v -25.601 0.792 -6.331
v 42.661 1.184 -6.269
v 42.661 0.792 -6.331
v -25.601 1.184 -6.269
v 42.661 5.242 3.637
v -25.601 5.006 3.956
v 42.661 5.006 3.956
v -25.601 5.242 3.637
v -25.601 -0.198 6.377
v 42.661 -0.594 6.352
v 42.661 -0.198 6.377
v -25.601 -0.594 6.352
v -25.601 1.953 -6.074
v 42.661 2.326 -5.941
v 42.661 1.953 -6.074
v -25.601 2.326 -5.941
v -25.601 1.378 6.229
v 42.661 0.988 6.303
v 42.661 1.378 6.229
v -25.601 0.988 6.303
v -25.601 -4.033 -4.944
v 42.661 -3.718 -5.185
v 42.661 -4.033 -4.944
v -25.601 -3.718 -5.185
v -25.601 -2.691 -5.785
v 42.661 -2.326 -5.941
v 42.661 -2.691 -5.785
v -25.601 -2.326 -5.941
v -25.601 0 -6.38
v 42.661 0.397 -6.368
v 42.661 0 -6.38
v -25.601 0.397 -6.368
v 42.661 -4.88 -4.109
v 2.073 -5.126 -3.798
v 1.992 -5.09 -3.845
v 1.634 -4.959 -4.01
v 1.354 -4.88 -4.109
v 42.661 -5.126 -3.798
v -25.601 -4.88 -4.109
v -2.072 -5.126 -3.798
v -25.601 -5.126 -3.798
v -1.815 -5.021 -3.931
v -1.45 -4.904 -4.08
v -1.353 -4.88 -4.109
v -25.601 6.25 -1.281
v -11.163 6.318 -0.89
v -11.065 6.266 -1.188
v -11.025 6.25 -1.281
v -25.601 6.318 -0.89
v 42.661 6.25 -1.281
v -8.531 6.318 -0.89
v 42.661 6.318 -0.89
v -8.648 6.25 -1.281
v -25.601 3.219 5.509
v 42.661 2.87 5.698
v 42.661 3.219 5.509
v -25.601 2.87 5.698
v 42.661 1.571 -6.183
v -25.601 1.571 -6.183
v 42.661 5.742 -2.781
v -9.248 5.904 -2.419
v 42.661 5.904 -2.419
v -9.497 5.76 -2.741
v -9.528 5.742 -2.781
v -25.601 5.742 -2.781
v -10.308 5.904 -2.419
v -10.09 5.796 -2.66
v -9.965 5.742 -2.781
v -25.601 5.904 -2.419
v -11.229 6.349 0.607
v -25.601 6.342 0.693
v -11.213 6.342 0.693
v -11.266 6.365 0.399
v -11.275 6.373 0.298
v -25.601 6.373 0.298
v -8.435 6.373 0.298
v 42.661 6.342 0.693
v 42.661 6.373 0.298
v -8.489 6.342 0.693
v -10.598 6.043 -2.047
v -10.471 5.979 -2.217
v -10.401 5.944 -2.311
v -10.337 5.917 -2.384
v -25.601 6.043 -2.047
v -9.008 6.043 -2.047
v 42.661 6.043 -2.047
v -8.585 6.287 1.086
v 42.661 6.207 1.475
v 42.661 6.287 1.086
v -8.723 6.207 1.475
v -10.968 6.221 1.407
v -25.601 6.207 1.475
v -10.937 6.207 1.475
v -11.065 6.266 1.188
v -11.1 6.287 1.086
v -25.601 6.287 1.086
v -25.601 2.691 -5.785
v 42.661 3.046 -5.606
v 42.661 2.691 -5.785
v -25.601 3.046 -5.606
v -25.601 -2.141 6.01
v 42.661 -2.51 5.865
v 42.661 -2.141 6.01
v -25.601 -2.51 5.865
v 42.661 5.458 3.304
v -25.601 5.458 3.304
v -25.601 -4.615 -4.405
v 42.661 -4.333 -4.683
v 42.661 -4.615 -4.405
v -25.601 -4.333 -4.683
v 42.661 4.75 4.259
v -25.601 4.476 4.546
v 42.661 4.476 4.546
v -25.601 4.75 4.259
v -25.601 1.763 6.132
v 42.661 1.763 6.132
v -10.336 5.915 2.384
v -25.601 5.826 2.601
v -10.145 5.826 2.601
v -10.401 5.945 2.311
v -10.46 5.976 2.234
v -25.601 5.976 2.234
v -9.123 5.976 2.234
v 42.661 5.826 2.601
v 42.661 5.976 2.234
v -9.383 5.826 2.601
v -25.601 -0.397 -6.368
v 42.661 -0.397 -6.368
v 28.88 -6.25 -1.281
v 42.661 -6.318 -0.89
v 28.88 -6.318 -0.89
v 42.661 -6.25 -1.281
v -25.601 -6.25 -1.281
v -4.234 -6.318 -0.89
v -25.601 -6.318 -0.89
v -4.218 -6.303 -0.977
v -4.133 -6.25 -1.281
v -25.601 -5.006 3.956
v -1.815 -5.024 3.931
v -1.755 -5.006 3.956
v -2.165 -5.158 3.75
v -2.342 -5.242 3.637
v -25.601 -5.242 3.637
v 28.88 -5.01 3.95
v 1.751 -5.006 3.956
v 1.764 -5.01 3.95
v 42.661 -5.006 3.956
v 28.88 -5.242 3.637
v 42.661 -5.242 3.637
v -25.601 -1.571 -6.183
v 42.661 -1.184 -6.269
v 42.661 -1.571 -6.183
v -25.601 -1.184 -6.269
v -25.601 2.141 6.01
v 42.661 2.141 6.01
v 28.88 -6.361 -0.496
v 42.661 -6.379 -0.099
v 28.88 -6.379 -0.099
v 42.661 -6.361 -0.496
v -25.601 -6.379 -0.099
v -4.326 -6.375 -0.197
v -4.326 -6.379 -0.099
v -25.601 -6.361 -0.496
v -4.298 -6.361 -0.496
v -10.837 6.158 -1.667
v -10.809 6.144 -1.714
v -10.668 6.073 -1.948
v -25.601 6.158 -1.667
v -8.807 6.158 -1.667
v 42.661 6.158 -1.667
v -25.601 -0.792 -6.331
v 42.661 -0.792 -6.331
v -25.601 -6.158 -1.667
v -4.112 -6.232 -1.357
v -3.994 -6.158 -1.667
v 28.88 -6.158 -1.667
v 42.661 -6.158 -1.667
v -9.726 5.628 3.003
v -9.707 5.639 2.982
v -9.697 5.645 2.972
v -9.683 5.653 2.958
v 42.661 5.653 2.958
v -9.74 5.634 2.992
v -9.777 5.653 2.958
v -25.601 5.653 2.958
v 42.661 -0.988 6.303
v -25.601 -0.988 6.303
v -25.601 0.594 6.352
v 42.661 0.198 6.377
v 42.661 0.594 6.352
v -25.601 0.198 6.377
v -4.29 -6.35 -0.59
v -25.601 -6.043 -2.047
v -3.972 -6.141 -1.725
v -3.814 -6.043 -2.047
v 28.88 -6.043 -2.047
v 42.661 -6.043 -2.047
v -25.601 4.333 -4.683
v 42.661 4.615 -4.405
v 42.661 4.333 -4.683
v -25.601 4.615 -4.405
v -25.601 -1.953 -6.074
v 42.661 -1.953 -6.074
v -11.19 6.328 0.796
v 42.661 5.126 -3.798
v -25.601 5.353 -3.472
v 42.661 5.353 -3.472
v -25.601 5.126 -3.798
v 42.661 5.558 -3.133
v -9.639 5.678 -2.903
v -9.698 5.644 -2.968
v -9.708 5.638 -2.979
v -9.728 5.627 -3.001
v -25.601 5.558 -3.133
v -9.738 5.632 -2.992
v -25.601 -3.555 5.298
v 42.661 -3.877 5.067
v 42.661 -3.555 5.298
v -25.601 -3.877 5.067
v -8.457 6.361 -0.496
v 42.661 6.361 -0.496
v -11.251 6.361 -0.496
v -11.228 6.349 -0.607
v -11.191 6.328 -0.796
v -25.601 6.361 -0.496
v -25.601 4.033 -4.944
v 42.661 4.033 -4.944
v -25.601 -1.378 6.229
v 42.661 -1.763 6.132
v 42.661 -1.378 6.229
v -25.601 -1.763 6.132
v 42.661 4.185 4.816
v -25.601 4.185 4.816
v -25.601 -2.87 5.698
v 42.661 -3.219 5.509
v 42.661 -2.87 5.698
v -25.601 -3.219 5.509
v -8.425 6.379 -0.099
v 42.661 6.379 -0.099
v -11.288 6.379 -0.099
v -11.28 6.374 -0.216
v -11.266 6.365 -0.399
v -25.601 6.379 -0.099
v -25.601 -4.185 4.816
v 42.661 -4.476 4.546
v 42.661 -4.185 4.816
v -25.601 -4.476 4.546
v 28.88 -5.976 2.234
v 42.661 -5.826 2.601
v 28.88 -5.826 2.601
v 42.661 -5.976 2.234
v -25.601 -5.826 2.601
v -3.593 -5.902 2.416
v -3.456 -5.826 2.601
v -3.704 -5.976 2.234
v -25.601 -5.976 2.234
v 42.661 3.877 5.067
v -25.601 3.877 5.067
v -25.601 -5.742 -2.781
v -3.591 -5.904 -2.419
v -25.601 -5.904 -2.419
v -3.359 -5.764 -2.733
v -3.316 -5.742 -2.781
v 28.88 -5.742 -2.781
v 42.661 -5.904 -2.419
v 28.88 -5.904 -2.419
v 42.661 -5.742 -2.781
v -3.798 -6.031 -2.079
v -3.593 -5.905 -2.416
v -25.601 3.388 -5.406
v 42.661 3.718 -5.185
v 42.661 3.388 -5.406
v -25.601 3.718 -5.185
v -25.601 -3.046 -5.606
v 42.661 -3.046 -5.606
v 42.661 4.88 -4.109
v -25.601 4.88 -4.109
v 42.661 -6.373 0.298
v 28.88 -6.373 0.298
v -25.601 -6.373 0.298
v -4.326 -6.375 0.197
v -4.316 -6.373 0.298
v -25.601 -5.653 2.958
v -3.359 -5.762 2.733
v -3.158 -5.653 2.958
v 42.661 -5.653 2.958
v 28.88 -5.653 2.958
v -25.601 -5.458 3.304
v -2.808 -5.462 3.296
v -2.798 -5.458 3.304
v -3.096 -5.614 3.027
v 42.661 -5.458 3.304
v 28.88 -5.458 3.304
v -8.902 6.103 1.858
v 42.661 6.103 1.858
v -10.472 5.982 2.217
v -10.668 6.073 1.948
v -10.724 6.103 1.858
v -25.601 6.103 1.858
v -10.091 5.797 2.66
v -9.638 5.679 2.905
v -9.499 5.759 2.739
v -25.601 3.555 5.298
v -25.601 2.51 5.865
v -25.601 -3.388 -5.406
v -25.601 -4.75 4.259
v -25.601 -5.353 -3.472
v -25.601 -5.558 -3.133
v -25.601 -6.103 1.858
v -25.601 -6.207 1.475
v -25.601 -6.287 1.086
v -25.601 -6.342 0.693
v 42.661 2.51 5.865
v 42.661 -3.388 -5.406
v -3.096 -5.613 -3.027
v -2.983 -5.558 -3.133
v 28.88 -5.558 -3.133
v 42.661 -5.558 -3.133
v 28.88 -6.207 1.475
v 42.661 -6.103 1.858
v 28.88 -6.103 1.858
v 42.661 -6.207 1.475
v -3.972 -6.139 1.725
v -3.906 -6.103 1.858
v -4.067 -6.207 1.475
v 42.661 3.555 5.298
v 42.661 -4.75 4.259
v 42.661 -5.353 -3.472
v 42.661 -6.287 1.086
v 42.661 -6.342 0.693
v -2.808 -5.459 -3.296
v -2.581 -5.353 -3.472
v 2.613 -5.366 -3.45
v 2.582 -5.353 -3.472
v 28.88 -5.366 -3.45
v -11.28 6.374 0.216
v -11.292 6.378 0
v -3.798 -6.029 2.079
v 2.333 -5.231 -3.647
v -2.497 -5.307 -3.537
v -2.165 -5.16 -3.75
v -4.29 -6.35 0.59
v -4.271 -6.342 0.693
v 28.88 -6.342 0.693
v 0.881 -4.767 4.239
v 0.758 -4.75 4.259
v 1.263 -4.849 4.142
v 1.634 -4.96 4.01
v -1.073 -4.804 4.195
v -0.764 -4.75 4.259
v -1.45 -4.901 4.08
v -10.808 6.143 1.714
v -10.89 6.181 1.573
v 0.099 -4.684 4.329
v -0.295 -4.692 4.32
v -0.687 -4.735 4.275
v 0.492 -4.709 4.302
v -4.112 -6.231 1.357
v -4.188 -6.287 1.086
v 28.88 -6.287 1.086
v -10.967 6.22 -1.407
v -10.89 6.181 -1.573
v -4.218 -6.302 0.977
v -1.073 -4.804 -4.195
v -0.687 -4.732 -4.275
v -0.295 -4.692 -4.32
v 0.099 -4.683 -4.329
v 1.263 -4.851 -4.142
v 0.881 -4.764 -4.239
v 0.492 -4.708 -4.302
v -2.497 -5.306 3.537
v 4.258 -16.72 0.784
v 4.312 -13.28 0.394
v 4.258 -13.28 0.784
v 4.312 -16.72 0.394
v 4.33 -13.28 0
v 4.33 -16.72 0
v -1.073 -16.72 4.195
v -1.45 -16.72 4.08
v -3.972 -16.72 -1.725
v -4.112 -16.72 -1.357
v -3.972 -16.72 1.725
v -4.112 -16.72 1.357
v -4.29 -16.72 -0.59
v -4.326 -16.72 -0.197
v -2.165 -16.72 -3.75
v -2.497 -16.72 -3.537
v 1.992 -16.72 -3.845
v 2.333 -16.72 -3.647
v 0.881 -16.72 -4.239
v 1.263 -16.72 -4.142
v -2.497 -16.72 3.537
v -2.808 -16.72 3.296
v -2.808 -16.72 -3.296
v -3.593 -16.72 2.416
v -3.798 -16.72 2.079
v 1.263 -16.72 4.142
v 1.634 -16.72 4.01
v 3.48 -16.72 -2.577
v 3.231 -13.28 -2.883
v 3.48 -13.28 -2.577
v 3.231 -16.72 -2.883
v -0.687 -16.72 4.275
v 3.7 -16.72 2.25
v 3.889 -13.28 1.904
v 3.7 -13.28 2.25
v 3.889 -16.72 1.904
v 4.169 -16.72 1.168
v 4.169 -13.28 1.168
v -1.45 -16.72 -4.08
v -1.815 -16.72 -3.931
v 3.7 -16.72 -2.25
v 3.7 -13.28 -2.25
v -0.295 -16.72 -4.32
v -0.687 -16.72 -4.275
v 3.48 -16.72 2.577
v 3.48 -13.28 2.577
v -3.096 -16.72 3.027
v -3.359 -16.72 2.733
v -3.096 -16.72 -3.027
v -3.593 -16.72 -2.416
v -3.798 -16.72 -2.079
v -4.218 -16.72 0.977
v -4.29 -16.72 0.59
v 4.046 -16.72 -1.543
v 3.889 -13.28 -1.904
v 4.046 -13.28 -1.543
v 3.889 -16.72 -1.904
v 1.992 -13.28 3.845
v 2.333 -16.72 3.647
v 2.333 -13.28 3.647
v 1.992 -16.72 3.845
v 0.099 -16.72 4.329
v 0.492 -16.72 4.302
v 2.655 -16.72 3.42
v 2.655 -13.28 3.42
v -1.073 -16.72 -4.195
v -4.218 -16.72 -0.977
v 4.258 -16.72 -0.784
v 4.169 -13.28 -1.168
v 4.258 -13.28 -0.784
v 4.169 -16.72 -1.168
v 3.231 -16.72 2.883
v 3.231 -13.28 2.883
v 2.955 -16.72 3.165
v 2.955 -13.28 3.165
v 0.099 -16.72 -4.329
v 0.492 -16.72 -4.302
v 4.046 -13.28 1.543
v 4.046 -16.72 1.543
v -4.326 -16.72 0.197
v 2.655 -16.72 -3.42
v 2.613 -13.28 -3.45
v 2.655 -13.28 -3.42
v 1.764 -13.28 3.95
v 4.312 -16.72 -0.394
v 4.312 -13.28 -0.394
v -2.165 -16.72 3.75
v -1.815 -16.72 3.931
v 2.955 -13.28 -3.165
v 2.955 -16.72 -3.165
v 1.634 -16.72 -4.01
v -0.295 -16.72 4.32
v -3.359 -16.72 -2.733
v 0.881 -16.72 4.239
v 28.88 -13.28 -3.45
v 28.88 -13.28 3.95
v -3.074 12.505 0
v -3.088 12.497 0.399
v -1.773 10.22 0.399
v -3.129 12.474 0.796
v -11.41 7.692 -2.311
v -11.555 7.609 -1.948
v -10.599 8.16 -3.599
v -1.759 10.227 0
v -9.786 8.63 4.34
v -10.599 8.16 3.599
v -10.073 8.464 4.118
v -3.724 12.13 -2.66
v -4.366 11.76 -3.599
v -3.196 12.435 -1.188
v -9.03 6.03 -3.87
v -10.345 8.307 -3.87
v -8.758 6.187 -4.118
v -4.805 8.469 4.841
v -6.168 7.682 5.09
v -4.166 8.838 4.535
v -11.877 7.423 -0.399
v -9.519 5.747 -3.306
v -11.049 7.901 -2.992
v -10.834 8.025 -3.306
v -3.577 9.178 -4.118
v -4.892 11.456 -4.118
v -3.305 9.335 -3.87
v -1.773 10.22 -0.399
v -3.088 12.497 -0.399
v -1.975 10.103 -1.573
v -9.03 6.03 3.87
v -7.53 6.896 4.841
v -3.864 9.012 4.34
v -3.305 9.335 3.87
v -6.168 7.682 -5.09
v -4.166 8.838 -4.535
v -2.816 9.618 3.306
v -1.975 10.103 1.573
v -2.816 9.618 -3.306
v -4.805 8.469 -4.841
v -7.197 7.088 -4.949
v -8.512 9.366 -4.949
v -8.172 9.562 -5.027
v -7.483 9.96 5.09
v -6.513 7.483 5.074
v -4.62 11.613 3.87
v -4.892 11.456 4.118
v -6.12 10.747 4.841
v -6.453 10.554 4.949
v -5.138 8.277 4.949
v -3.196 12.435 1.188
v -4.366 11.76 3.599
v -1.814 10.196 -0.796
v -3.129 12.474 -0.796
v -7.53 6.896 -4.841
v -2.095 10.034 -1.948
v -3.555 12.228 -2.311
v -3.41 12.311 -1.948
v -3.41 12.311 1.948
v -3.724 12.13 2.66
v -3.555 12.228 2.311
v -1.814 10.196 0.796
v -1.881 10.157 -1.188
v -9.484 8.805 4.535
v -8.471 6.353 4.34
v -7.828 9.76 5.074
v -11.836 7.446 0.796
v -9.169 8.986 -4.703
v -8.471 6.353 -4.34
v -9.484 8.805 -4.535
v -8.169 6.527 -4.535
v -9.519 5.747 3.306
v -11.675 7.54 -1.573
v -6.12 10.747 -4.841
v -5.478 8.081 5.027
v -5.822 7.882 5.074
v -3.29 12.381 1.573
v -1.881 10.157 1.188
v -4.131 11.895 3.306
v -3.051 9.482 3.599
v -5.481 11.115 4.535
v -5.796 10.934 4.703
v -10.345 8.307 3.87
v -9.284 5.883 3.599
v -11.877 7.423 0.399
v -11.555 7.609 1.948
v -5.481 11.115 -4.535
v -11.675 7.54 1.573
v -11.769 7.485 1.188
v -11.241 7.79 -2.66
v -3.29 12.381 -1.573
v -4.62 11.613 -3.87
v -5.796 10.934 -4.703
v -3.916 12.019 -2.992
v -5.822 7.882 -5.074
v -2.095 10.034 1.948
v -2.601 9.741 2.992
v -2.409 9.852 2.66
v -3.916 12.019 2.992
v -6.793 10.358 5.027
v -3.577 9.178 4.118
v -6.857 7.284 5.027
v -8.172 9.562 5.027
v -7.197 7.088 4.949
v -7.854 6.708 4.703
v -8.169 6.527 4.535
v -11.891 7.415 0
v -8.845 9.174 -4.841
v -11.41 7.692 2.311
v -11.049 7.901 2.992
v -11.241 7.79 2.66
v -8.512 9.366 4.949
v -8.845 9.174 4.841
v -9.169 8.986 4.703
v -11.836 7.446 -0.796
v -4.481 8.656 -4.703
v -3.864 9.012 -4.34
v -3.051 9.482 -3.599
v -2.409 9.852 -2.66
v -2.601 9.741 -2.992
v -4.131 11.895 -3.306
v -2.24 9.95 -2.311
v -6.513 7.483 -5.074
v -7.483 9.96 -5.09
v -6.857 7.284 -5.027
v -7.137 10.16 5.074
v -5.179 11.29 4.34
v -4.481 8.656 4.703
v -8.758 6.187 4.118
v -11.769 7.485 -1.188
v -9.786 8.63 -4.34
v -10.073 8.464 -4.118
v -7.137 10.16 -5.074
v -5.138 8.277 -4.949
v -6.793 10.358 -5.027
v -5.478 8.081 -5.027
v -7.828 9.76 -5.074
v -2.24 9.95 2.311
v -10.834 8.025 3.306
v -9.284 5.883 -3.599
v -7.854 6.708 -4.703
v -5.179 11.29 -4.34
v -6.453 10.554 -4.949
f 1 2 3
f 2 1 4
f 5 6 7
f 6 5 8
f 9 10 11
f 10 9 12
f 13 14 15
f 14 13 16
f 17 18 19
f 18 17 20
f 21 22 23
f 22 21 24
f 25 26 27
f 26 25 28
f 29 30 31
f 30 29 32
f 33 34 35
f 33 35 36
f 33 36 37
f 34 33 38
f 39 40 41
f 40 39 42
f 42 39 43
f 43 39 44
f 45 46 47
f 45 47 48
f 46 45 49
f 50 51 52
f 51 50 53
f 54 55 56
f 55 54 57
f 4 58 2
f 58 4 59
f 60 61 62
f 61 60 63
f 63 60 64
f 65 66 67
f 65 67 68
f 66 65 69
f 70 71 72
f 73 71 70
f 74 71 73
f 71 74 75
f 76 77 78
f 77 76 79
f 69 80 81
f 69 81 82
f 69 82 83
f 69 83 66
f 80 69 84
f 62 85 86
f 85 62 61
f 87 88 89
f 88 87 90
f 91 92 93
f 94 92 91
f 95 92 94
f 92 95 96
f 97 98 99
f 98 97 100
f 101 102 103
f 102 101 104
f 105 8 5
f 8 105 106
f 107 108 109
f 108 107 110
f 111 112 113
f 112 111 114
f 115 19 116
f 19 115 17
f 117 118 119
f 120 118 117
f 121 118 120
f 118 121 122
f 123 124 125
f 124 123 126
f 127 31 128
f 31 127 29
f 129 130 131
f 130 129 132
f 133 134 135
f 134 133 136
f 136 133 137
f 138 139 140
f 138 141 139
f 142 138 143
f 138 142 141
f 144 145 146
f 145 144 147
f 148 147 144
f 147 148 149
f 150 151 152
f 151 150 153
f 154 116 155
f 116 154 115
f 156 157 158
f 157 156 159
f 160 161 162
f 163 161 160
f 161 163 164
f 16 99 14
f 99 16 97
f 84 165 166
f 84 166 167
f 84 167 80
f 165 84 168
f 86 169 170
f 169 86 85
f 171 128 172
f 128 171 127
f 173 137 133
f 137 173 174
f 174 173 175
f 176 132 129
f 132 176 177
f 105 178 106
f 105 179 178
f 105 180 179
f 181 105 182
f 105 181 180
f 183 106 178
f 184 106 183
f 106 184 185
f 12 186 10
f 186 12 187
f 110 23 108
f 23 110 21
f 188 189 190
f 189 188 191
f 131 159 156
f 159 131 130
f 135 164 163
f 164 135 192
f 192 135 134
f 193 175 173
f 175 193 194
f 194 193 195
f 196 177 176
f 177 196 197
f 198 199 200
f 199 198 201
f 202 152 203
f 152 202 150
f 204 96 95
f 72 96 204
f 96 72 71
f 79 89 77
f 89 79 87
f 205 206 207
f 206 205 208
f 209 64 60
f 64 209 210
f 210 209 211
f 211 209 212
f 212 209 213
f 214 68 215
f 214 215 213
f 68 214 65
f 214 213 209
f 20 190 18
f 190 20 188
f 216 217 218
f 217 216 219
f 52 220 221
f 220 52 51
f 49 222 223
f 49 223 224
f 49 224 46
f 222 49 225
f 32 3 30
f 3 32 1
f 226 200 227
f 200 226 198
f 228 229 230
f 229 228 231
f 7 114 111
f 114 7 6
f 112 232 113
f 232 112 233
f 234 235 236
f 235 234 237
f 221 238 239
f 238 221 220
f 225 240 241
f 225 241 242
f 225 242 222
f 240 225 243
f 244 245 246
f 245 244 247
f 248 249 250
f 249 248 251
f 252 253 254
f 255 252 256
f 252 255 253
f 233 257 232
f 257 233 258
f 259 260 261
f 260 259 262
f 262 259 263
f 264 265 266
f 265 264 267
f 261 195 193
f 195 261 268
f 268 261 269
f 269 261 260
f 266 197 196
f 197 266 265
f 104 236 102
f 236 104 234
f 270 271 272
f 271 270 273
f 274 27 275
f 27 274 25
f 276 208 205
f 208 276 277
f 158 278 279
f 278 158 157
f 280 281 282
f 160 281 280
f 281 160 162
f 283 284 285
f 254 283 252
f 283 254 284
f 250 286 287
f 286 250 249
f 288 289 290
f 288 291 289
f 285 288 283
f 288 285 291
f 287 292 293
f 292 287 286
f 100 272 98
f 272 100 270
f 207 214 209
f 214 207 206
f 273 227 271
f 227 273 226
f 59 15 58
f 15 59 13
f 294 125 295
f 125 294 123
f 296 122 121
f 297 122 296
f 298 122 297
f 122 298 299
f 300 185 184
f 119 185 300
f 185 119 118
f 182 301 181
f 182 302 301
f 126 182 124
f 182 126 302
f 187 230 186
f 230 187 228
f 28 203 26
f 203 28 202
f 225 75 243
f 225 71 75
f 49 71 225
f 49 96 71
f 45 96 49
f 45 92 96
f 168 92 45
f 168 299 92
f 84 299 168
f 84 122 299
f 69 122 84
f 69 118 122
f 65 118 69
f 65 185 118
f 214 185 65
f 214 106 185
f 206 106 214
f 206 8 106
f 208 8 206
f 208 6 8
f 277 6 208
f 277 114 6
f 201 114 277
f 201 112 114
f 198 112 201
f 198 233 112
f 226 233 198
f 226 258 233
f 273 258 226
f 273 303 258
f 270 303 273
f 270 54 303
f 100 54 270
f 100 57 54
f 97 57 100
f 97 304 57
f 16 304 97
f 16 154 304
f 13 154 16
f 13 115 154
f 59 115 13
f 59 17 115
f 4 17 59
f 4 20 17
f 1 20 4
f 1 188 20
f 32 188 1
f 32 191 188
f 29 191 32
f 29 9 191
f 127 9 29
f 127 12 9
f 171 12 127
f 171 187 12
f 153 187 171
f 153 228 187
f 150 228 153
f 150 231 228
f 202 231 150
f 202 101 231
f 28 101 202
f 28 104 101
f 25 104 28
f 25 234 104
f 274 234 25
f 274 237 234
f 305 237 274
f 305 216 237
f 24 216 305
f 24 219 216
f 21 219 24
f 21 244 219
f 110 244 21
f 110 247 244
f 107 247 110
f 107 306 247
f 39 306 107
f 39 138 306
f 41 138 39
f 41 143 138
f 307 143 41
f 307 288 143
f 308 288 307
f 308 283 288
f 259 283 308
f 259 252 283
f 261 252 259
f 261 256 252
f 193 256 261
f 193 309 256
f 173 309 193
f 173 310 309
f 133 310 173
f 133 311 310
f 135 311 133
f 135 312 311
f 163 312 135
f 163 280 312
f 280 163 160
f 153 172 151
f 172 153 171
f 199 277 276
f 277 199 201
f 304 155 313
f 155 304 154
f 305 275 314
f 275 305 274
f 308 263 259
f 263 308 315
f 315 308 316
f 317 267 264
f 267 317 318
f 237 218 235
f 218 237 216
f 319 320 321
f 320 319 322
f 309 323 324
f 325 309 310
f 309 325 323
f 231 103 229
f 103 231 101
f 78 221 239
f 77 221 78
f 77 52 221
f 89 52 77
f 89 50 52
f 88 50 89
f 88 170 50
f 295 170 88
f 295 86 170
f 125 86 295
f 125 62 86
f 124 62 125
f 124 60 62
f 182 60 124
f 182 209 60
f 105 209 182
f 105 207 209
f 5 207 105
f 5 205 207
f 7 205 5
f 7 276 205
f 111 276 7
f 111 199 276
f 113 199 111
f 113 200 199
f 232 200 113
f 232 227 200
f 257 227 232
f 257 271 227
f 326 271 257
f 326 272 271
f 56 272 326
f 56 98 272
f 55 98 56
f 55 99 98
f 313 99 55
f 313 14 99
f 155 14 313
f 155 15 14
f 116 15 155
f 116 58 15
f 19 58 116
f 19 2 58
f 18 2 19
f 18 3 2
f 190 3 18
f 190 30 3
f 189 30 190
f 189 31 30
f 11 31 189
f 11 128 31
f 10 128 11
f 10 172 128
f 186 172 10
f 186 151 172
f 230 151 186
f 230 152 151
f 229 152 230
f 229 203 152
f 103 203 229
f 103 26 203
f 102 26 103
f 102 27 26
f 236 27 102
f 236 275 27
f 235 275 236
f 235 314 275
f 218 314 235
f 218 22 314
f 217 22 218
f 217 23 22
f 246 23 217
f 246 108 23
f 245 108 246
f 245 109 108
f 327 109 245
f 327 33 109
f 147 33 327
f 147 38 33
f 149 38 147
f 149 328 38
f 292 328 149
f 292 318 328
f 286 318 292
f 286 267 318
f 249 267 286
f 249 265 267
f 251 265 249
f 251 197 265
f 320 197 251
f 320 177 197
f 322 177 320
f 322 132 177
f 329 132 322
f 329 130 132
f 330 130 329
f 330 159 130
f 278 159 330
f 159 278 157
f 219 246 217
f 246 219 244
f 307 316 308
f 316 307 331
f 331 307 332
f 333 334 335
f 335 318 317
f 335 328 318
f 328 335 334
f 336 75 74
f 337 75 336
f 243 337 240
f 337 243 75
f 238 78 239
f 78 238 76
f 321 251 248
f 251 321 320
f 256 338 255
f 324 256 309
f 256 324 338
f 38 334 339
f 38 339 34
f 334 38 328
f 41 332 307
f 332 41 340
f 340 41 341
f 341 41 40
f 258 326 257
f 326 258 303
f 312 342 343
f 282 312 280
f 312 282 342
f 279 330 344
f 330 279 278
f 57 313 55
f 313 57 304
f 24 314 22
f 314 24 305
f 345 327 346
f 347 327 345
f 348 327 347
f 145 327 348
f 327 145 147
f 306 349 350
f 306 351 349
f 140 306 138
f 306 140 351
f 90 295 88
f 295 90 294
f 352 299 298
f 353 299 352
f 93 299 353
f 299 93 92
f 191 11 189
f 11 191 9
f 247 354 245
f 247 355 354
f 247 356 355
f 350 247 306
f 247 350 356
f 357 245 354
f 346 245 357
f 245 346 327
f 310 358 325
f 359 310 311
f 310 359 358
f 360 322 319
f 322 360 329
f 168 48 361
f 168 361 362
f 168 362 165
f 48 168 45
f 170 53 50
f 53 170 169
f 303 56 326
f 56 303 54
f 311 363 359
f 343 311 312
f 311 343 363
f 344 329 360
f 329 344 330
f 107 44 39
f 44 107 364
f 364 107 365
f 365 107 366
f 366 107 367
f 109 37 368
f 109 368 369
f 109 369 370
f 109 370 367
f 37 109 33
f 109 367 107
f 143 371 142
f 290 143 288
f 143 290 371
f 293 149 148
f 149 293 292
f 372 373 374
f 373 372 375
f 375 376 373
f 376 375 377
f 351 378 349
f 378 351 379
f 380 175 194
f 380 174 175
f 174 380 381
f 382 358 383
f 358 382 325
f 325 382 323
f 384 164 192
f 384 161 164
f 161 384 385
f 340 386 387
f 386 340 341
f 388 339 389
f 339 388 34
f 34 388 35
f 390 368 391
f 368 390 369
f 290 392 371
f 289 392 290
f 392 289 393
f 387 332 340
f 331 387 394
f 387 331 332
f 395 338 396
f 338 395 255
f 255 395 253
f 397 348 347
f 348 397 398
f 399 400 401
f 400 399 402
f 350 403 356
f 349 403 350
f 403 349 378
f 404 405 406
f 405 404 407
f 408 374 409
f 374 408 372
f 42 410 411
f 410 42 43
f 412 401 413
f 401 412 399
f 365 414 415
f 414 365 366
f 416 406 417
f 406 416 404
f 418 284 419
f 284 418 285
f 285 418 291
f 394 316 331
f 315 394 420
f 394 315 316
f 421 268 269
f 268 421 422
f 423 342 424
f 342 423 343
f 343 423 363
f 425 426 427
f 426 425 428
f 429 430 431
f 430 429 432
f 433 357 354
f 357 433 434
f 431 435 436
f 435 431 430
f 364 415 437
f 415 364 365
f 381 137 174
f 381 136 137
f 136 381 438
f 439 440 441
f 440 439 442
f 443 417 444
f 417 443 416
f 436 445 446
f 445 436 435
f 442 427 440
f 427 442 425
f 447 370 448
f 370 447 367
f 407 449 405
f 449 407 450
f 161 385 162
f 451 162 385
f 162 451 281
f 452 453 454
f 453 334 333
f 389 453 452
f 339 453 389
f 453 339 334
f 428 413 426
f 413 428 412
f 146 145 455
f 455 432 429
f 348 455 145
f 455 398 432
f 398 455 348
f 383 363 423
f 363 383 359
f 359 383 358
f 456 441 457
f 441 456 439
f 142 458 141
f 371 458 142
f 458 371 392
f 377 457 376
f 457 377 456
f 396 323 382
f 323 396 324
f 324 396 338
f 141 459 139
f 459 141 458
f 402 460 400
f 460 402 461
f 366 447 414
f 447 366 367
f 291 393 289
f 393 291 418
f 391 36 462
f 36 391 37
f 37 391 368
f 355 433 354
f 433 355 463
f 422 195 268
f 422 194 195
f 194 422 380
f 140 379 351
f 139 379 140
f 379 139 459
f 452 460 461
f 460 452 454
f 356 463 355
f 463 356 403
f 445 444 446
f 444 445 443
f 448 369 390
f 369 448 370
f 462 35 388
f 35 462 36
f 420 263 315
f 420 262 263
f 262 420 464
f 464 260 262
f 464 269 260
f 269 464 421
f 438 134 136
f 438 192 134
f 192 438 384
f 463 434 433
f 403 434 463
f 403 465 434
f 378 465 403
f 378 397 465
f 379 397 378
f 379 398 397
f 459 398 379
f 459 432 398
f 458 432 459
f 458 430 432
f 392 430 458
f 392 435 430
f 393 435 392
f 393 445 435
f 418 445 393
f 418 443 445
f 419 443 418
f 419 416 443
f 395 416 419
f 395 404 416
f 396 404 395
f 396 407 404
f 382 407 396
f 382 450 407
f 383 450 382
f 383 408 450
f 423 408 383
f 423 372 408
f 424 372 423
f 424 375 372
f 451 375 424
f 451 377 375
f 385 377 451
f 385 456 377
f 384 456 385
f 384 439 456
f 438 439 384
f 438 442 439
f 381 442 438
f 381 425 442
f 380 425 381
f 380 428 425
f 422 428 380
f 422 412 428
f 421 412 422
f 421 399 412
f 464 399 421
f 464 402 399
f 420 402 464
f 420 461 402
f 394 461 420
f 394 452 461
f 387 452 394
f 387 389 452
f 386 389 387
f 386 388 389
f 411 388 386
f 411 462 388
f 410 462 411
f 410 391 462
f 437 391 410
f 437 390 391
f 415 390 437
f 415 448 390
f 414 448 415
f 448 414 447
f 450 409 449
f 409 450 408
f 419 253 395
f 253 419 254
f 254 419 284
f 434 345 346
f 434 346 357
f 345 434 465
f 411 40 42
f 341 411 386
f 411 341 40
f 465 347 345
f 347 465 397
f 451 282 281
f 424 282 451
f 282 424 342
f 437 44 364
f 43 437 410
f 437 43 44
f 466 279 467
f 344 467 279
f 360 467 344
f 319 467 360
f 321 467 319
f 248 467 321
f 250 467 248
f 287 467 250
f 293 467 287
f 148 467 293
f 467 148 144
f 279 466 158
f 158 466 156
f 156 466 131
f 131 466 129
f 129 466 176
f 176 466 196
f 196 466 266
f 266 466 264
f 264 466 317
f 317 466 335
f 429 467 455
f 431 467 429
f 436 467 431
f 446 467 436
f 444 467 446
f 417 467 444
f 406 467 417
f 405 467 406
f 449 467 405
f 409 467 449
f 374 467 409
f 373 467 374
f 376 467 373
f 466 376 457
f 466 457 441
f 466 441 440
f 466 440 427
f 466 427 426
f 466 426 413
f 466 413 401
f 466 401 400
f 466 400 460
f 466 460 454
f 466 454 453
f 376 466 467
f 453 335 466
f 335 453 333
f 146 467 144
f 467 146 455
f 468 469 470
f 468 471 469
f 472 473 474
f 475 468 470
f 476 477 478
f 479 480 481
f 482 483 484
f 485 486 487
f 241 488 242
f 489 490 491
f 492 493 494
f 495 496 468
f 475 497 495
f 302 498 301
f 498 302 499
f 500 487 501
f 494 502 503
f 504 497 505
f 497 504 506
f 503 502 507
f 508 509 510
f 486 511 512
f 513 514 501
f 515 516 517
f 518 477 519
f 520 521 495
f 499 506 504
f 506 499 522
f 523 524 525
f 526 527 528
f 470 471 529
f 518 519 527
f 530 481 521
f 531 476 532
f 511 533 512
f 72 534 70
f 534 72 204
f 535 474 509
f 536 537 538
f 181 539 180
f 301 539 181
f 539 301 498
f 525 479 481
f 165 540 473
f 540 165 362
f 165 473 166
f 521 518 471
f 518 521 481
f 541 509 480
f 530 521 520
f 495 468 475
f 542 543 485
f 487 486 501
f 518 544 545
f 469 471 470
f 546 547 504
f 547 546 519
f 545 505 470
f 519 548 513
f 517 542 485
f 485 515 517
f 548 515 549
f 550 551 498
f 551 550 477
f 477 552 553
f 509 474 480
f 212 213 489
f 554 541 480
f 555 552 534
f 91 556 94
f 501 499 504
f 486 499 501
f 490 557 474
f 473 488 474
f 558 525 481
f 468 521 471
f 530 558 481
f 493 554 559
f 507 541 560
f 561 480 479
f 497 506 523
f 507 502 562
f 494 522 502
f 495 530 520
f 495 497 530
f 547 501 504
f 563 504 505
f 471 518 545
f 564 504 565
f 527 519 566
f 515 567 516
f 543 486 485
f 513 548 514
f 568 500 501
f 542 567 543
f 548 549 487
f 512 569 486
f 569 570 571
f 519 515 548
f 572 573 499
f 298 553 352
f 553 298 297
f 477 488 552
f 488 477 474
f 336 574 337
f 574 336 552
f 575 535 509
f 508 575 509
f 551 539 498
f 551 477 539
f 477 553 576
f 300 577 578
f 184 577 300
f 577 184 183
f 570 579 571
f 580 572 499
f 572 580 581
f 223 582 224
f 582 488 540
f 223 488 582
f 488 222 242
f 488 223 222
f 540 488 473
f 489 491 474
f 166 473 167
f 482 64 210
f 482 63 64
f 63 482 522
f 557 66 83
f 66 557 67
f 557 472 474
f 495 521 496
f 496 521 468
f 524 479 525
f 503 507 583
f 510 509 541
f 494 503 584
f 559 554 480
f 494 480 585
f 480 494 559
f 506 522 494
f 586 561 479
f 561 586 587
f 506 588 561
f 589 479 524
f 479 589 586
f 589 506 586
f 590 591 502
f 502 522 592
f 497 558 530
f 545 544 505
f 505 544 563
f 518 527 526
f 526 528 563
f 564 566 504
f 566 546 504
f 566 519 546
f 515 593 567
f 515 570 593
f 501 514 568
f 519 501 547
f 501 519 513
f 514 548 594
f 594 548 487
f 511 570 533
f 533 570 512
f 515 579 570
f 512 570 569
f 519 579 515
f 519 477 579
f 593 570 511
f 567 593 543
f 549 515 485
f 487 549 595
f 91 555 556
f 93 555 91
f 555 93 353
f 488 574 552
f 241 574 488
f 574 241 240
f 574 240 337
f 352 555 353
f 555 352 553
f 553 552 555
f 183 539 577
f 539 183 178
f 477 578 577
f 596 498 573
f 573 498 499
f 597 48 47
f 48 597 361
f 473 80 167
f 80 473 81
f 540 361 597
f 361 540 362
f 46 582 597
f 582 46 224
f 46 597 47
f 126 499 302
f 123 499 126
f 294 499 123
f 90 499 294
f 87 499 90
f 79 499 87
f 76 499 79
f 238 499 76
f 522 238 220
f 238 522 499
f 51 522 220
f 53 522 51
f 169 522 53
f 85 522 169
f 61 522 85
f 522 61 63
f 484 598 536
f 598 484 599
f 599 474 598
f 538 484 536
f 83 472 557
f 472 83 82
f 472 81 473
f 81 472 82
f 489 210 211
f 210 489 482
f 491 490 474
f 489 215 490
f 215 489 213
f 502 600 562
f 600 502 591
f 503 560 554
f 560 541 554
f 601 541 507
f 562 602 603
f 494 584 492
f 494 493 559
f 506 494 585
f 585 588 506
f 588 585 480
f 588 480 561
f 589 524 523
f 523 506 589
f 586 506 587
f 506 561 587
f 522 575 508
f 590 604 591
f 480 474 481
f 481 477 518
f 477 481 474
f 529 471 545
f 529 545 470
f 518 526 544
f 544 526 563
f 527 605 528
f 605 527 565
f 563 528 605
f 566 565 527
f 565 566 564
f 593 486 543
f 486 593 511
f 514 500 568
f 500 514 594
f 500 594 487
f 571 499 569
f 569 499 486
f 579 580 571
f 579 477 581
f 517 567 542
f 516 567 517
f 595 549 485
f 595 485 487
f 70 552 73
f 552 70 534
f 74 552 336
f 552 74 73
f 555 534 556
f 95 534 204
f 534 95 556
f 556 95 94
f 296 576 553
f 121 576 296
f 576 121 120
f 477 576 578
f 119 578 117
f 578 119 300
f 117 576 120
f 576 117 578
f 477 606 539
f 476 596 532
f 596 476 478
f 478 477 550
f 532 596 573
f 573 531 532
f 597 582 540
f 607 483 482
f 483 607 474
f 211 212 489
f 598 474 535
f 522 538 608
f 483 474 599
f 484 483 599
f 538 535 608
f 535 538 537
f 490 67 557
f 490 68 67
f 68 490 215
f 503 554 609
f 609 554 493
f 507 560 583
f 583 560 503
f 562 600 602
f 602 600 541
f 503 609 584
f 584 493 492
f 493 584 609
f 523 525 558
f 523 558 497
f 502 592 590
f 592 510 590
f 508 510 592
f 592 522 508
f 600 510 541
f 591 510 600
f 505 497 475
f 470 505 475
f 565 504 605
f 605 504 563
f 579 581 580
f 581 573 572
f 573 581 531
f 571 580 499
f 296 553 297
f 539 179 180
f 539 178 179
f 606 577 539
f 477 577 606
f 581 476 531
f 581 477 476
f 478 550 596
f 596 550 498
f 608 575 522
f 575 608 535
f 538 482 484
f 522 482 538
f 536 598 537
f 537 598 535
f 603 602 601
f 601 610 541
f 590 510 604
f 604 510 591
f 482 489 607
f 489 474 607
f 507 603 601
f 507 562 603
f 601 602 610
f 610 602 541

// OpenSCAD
// file: master_airbrush_measurements.scad
eps = 0.05;
measured_barrel_diameter = 12.01; 
barrel_length = 68.26;
barrel_back_to_air_hose = 21.27;
brace_height = 6.9;
brace_width = 7.40;
brace_length = 28.88;
air_hose_diameter = 8.66;
air_hose_barrel_length = 10.34;
m_trigger_pad_diameter = 10.18;
m_trigger_pad_thickness = 2.63;
m_trigger_pad_cl_to_barrel_cl_0_degrees = 10.65;

pad_diameter = 10.74;
pad_height = 2.60;
// main file
include <master_airbrush_measurements.scad>;

/* [Boiler Plate] */

$fa = 1;
$fs = 0.4;
eps = 0.001;

infinity = 1000;

/* [Show] */

show_air_brush = true;
barrel_diameter_clearance = 0.75;

barrel_diameter = measured_barrel_diameter + barrel_diameter_clearance;
_trigger_pad_diameter = m_trigger_pad_diameter + 0.0;
_trigger_pad_thickness = m_trigger_pad_thickness + 0.0;

module _barrel() {
    // Display horizontal zero 
    h = barrel_length +2*eps;
    d = barrel_diameter;
    translate([-eps, 0, 0]) rotate([0,90,0]) cylinder(h=h, d=d, center=false);
}

module _air_hose_barrel() {
    dx = barrel_back_to_air_hose + air_hose_diameter/2;
    h = air_hose_barrel_length + barrel_diameter/2;
    
    translate([dx, 0, 0]) 
        rotate([90,0,0]) 
            cylinder(h=h, d=air_hose_diameter, center=false);
}

module _brace() {
    // Entire block, before carve outs
    x = brace_length + air_hose_diameter/2;
    z = brace_height + barrel_diameter/2;
    dx = barrel_back_to_air_hose + air_hose_diameter/2;
    dz = -brace_height/2;
    translate([dx, 0, dz]) rotate([90, 0, 0]) cube([brace_length, brace_width, z]);
}

module _trigger_piece(angle) {
    pivot_offset = 3; // This is a guess
    dy_pivot = m_trigger_pad_cl_to_barrel_cl_0_degrees + pivot_offset;
    translate([0, -pivot_offset, 0])
    rotate([0, 0, angle]) {
        translate([0, dy_pivot, 0]) rotate([90, 0, 0]) {
            cylinder(h=_trigger_pad_thickness, d=_trigger_pad_diameter, center=true);
        }
    }
}

* _trigger_piece(30);

module _trigger(angle) {
    dx = barrel_back_to_air_hose + air_hose_diameter/2;
    dy = m_trigger_pad_cl_to_barrel_cl_0_degrees;
    translate([dx, 0, 0]) _trigger_piece(angle);
}

module air_brush(trigger_angle) {

    dx = -barrel_back_to_air_hose - air_hose_diameter/2;
    color("Red", alpha=0.25) {
        translate([dx, 0, 0]) {
            _barrel();
            _air_hose_barrel();
            _brace();
            _trigger(trigger_angle);
        }
    }
}
if (show_air_brush) {
    air_brush(trigger_angle=30);
}



module _trigger_cap_clearance() {
    width = 40;
    bottom_radius = 8;
    top_radius = 22;
    height = top_radius - bottom_radius;
    dz = -width/2;
    rotate([90, 0, 0]) translate([0,0,dz])  {
        rotate_extrude(angle = 30, convexity = 2) {
           translate([bottom_radius,0,0]) square([height,width]);
        }  
    }  
}

*_trigger_cap_clearance();
